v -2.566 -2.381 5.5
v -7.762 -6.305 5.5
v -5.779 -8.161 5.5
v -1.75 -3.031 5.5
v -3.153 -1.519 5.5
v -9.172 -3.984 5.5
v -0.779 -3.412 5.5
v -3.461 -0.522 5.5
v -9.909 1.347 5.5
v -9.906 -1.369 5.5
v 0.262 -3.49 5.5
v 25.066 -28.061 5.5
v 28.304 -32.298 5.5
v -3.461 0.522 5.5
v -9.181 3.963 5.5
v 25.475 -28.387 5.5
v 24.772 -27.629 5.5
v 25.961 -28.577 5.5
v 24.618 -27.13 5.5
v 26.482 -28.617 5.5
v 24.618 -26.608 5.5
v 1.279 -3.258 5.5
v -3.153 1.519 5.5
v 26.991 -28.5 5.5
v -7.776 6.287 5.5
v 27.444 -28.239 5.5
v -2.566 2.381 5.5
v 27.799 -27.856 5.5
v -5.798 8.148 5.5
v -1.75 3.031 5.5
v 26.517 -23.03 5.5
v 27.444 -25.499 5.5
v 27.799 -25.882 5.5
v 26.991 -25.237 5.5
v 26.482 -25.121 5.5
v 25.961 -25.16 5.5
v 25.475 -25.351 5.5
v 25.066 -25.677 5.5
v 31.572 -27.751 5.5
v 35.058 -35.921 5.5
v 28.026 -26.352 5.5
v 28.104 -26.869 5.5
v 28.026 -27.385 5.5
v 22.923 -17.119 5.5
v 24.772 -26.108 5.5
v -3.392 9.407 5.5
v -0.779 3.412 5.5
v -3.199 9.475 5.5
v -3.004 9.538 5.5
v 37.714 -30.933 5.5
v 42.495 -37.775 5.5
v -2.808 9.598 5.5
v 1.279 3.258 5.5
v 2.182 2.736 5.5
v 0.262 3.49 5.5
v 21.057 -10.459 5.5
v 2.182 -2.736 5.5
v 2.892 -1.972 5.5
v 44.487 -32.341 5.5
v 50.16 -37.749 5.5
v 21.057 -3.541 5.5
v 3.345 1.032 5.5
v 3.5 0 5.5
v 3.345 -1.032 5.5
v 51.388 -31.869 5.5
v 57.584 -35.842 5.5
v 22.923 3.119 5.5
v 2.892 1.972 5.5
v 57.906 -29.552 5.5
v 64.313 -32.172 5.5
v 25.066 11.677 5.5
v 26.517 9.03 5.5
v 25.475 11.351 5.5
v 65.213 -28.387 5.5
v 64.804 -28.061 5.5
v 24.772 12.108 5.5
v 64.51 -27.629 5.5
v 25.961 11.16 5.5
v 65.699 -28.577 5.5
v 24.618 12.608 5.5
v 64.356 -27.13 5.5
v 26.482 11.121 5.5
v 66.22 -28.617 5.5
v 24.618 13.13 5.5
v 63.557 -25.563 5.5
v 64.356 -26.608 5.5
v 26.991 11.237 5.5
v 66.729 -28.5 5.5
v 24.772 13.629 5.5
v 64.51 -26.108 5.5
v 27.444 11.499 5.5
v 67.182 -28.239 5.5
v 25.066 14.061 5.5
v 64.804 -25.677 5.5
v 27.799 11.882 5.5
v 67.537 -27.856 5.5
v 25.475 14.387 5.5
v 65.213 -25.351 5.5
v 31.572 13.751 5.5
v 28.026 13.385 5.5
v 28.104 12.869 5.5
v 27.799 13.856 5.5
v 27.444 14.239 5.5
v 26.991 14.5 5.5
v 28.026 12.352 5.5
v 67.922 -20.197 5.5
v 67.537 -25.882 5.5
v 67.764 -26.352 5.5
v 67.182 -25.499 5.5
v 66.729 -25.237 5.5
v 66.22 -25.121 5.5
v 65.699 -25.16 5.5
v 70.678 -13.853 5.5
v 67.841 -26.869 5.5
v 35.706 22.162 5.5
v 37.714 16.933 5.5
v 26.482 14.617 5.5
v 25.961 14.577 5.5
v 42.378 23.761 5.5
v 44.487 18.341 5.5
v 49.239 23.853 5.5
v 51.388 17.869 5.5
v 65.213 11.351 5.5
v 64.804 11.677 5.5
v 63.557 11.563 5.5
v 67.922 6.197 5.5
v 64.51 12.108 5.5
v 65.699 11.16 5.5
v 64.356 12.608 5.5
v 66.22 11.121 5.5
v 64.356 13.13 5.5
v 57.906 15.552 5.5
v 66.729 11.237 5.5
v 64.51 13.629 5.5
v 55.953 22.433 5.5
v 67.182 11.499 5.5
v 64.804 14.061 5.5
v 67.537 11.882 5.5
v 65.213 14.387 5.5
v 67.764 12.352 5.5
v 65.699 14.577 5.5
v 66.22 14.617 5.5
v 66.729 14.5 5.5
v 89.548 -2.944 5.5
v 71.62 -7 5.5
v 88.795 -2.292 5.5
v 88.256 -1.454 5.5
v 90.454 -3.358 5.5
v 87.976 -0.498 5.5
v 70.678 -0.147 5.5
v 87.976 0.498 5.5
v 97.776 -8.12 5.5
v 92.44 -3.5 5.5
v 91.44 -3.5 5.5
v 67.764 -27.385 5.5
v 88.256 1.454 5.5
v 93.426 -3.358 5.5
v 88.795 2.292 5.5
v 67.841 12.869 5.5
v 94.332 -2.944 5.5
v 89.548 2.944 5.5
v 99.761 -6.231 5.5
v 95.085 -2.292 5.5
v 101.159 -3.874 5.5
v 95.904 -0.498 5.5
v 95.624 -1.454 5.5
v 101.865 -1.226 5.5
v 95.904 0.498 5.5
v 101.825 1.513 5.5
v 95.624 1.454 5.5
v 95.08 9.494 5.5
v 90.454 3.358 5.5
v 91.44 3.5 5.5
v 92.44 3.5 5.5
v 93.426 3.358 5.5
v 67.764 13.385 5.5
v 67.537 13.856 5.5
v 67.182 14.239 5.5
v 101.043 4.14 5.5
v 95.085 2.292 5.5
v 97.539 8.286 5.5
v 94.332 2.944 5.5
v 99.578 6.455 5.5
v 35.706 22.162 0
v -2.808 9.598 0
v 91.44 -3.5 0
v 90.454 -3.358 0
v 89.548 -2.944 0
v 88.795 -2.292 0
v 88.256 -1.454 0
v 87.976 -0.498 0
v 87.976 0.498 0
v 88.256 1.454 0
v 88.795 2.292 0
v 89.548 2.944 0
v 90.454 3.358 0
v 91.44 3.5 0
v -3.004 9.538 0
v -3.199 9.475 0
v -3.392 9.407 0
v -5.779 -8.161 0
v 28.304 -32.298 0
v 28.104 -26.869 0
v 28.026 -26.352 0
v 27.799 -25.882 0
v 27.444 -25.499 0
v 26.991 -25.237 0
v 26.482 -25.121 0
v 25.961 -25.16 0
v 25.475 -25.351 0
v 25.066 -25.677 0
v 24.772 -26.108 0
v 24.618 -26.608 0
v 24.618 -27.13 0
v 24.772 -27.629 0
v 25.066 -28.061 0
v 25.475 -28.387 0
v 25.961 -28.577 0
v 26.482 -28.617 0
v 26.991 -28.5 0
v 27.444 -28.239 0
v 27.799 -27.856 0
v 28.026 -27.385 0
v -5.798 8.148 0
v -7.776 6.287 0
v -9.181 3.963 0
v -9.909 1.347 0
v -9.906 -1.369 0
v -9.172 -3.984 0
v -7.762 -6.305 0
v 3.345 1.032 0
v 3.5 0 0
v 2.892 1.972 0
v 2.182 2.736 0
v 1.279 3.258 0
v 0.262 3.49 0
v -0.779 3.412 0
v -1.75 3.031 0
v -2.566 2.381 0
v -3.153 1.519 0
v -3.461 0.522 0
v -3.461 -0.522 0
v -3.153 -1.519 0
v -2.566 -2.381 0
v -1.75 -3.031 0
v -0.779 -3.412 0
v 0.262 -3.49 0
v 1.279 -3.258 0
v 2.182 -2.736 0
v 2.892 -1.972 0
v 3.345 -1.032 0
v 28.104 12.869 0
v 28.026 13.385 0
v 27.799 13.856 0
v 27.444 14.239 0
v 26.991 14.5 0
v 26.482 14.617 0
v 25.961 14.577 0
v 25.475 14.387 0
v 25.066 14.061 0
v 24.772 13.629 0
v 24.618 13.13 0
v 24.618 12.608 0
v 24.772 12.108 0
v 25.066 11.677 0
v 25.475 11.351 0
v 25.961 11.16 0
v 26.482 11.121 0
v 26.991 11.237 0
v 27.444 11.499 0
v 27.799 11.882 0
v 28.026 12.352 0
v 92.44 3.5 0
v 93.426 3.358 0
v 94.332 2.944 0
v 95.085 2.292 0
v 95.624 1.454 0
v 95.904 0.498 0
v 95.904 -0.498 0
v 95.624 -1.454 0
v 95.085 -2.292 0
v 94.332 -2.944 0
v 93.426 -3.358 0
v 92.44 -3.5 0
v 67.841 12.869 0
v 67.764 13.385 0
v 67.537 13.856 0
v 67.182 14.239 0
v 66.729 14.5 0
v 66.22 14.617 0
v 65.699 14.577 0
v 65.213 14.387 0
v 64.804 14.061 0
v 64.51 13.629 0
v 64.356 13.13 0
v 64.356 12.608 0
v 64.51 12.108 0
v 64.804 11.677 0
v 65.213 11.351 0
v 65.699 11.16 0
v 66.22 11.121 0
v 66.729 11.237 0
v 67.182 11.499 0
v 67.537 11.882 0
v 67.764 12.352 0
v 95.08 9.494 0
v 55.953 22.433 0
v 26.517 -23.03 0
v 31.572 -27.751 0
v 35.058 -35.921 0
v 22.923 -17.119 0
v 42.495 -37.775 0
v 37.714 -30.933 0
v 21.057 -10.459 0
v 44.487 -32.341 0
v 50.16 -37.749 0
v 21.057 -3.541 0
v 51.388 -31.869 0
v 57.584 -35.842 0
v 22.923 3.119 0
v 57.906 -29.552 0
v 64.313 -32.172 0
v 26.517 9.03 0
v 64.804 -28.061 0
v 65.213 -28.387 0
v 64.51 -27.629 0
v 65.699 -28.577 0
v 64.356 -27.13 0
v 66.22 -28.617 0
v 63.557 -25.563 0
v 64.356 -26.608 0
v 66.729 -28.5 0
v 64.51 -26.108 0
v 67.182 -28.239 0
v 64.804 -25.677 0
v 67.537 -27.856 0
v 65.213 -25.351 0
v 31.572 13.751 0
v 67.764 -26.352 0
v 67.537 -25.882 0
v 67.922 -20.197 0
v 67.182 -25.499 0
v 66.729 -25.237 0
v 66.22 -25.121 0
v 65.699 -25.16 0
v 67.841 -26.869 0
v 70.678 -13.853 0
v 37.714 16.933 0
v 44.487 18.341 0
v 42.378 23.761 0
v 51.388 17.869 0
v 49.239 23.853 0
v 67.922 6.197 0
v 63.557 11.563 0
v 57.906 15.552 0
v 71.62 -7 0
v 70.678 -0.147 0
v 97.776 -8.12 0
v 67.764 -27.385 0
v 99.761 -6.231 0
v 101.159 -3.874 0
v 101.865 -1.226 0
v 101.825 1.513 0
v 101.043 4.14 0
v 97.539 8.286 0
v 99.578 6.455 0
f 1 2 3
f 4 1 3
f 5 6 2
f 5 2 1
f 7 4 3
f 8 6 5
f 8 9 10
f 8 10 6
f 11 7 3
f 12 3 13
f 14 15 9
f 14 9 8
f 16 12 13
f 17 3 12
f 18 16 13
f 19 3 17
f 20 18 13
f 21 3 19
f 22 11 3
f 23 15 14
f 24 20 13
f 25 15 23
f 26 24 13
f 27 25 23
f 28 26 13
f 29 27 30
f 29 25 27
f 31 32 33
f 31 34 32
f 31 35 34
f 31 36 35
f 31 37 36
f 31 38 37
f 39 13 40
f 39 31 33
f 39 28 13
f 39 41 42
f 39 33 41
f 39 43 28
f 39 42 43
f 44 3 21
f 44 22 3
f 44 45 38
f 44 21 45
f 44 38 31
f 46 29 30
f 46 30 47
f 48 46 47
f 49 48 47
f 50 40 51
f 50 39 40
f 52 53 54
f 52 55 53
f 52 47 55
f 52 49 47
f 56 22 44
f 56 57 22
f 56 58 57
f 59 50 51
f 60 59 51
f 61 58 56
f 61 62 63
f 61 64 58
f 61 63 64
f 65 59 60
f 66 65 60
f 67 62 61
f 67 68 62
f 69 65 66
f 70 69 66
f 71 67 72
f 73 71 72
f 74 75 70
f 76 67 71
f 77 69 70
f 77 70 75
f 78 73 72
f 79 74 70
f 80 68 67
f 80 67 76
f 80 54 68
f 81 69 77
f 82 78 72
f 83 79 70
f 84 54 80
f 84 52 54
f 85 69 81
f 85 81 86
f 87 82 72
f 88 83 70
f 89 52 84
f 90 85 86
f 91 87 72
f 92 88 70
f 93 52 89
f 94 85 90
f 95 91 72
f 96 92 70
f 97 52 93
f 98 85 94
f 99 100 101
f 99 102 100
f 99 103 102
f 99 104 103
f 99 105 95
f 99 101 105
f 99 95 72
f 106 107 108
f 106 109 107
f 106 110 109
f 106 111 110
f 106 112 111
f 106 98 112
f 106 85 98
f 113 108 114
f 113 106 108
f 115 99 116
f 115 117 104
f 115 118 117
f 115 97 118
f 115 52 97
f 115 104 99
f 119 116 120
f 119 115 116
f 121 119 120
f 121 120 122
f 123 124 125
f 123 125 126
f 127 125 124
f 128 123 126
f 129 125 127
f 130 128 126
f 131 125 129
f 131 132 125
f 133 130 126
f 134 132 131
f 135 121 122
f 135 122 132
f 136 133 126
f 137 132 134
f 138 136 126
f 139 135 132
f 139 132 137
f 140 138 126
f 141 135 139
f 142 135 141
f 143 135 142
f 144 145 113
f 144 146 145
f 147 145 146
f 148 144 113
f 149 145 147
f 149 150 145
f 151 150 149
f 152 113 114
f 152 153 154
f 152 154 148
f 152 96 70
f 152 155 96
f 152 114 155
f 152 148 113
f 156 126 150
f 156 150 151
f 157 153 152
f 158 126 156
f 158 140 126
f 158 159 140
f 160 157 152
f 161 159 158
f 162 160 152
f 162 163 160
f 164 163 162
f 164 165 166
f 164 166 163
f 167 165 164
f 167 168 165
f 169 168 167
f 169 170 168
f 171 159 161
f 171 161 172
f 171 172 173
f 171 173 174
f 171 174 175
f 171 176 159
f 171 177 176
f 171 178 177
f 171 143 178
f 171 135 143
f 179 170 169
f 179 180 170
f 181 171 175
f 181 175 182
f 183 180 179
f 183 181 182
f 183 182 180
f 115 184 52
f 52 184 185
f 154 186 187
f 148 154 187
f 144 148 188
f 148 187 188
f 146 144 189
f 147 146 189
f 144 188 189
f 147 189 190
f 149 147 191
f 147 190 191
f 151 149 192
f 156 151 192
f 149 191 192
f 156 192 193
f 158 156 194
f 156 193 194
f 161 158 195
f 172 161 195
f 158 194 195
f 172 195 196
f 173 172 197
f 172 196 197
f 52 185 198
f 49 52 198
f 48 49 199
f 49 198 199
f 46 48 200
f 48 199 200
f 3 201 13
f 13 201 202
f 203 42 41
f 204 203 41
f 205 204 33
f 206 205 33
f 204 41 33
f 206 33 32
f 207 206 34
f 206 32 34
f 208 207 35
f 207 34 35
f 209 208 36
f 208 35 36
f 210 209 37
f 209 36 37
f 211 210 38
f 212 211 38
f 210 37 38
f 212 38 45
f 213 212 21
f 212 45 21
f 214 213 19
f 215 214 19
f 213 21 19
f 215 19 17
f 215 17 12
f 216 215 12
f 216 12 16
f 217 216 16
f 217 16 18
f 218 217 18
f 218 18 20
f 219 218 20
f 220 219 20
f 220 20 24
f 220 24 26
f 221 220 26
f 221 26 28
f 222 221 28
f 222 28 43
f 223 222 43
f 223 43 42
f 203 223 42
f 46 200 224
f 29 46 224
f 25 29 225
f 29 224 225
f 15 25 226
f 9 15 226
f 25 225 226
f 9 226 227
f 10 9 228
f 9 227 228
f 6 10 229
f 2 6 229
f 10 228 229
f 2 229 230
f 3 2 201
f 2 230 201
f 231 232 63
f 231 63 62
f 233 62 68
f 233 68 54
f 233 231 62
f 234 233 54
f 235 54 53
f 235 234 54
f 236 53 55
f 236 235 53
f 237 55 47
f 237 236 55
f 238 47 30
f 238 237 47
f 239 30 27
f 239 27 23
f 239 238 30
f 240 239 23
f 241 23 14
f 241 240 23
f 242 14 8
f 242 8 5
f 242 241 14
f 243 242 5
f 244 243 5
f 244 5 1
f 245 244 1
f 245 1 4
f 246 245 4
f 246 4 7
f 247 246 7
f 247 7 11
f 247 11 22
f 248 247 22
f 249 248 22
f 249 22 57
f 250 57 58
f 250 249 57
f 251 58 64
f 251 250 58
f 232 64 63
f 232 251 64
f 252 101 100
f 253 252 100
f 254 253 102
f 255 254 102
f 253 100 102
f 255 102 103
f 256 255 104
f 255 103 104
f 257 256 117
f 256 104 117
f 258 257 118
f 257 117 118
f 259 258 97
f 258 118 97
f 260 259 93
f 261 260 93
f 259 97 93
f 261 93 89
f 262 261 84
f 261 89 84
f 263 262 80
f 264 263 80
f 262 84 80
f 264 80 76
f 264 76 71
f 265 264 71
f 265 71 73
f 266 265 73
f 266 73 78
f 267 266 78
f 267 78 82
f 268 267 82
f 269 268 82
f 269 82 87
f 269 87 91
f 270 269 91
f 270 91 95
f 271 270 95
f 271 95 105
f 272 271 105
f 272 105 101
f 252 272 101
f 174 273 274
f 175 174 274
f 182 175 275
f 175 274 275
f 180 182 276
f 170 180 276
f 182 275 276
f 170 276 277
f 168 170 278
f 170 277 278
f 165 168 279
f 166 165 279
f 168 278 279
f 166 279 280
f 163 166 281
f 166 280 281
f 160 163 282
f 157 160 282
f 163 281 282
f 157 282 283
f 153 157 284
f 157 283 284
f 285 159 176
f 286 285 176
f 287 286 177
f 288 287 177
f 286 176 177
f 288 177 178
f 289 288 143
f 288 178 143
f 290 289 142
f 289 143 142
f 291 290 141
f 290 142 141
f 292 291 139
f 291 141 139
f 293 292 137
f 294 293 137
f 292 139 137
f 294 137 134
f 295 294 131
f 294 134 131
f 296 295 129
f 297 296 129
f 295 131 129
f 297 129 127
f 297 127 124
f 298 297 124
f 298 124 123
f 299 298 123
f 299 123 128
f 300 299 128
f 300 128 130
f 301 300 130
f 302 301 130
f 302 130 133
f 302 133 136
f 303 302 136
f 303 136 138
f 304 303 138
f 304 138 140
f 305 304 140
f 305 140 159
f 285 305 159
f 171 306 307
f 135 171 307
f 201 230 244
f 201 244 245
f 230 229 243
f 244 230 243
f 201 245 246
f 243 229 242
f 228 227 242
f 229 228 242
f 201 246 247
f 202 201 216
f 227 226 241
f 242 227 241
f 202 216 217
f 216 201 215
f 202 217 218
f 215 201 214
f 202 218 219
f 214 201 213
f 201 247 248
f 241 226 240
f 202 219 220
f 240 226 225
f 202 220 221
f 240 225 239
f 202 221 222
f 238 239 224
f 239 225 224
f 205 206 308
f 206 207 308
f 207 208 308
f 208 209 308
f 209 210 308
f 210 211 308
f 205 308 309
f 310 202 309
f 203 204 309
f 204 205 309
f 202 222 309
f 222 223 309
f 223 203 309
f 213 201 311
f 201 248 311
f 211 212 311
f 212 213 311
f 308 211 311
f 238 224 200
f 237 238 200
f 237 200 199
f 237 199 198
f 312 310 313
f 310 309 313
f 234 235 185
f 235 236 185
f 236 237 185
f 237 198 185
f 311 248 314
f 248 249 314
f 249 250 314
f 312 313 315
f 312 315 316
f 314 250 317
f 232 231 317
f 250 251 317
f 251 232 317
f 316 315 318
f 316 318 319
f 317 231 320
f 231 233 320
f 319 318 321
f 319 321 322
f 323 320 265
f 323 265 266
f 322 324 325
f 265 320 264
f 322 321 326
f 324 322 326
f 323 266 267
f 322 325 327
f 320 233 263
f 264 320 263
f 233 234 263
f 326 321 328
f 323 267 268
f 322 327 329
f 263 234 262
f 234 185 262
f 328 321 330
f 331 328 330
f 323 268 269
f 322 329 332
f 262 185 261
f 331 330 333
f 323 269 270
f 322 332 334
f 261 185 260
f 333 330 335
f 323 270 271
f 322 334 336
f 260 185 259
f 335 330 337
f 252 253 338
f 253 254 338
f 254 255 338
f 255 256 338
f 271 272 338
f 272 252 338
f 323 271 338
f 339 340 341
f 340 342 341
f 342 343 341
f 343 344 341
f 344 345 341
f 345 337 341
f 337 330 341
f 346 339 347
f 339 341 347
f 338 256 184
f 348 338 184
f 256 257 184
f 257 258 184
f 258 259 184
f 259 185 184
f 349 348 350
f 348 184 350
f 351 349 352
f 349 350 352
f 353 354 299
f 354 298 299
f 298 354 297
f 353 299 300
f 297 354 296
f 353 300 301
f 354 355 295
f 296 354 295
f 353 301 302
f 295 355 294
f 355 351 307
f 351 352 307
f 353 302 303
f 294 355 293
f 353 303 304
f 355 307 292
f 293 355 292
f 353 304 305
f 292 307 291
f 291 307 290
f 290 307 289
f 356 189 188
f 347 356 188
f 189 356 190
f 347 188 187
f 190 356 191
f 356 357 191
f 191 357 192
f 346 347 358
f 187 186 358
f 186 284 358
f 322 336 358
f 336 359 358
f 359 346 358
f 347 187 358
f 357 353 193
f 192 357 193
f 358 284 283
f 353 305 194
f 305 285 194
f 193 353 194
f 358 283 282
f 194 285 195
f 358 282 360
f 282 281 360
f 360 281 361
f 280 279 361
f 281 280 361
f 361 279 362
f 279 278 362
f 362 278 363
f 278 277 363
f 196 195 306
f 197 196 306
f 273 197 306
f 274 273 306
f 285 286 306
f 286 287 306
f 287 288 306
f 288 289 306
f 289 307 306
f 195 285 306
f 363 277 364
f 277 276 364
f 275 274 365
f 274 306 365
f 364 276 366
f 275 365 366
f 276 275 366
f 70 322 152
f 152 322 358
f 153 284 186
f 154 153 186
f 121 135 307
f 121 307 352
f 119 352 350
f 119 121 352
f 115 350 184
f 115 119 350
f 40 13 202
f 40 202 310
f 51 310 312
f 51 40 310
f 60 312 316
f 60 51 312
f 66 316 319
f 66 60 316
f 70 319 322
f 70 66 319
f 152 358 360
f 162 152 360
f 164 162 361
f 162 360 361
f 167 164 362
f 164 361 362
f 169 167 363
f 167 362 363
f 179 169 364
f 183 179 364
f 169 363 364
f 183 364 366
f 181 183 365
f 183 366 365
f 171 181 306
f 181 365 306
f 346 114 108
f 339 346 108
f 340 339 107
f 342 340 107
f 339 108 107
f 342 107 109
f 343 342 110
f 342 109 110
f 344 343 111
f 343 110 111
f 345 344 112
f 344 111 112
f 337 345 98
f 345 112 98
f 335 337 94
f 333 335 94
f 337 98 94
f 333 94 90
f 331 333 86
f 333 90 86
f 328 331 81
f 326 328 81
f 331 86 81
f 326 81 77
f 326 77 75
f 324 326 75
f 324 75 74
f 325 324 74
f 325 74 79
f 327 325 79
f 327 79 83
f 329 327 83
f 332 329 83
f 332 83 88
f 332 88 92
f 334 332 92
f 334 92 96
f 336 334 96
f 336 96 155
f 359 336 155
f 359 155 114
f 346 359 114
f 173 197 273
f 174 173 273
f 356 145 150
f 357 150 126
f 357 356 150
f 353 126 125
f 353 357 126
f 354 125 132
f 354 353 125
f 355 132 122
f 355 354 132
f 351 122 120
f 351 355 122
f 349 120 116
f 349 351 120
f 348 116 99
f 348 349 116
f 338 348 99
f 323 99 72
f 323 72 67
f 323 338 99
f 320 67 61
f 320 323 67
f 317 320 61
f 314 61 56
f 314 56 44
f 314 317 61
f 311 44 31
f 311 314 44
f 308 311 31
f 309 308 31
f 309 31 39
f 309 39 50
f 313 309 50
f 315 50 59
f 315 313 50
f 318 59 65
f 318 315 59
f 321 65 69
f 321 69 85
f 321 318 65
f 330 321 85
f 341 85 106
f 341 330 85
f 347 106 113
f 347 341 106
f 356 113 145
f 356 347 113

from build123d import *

# Parameters (mm, degrees)
F0_R      = 3.5
F0_R_2    = 25.4
F1_DEPTH  = 5.5
F2_DEPTH  = 33
F3_DEPTH  = 28
F4_R      = 2.5
F5_DEPTH  = 25.4
F6_R      = 5.08
F7_R      = 40.64
F8_DEPTH  = 33
F9_R      = 1.7526
F10_DEPTH = 5.501


with BuildPart() as f1:
    # F0 (on Top) → F1 (new body)
    with BuildSketch(Plane.XY):
        with BuildLine():
            Line((-3.3917498572, 9.4072330101), (-2.8084065037, 9.5975441082))
            ThreePointArc((-2.8084065037, 9.5975441082), (-3.1015382157, 9.5068638728), (-3.3917498572, 9.4072330101))
        make_face()
        with BuildLine():
            Line((35.7055754428, 22.1624223313), (-2.8084065037, 9.5975441082))
            Line((-2.8084065037, 9.5975441082), (-3.3917498572, 9.4072330101))
            ThreePointArc((-3.3917498572, 9.4072330101), (-9.9089012804, 1.3467276694), (-5.7794328291, -8.1607693371))
            Line((-5.7794328291, -8.1607693371), (28.3037582299, -32.2983849452))
            ThreePointArc((28.3037582299, -32.2983849452), (15.5024060308, -2.8251442248), (35.7055754428, 22.1624223313))
        make_face()
        Circle(F0_R, mode=Mode.SUBTRACT)
        with BuildLine():
            ThreePointArc((55.9525424009, 22.43259449), (45.80637798, 23.9972404711), (35.7055754428, 22.1624223313))
            ThreePointArc((35.7055754428, 22.1624223313), (15.5024060308, -2.8251442248), (28.3037582299, -32.2983849452))
            ThreePointArc((28.3037582299, -32.2983849452), (46.3284941146, -37.999810145), (64.3128808741, -32.1723590805))
            ThreePointArc((64.3128808741, -32.1723590805), (73.805134648, -21.1442690321), (77.22, -7))
            ThreePointArc((77.22, -7), (71.3467667481, 11.1561447666), (55.9525424009, 22.43259449))
        make_face()
        with Locations((46.22, -7)):
            Circle(F0_R_2, mode=Mode.SUBTRACT)
        with BuildLine():
            Line((95.0795298067, 9.4943853194), (55.9525424009, 22.43259449))
            ThreePointArc((55.9525424009, 22.43259449), (71.3467667481, 11.1561447666), (77.22, -7))
            ThreePointArc((77.22, -7), (73.805134648, -21.1442690321), (64.3128808741, -32.1723590805))
            Line((64.3128808741, -32.1723590805), (97.7764131852, -8.1201158324))
            ThreePointArc((97.7764131852, -8.1201158324), (101.8248141538, 1.5134229894), (95.0795298067, 9.4943853194))
        make_face()
        with BuildLine():
            ThreePointArc((91.44, -3.5), (87.94, 0), (91.44, 3.5))
            Line((91.44, 3.5), (92.44, 3.5))
            ThreePointArc((92.44, 3.5), (95.94, 0), (92.44, -3.5))
            Line((92.44, -3.5), (91.44, -3.5))
        make_face(mode=Mode.SUBTRACT)
    extrude(amount=F1_DEPTH)

    # F0 (on Top) → F2 (join)
    with BuildSketch(Plane.XY):
        with BuildLine():
            ThreePointArc((55.9525424009, 22.43259449), (45.80637798, 23.9972404711), (35.7055754428, 22.1624223313))
            ThreePointArc((35.7055754428, 22.1624223313), (15.5024060308, -2.8251442248), (28.3037582299, -32.2983849452))
            ThreePointArc((28.3037582299, -32.2983849452), (46.3284941146, -37.999810145), (64.3128808741, -32.1723590805))
            ThreePointArc((64.3128808741, -32.1723590805), (73.805134648, -21.1442690321), (77.22, -7))
            ThreePointArc((77.22, -7), (71.3467667481, 11.1561447666), (55.9525424009, 22.43259449))
        make_face()
        with Locations((46.22, -7)):
            Circle(F0_R_2, mode=Mode.SUBTRACT)
        with Locations((46.22, -7)):
            Circle(F0_R_2)
    extrude(amount=-F2_DEPTH)

    # F0 (on Top) → F3 (cut)
    with BuildSketch(Plane.XY):
        with Locations((46.22, -7)):
            Circle(F0_R_2)
    extrude(amount=-F3_DEPTH, mode=Mode.SUBTRACT)

    # F4 (on face) → F5 (cut)
    with BuildSketch(Plane(origin=(0, 0, -33), x_dir=(1, 0, 0), z_dir=(0, 0, -1))):
        with Locations((46.22, 7)):
            Circle(F4_R)
    extrude(amount=-F5_DEPTH, mode=Mode.SUBTRACT)

    # F6
    f6_edges = [f1.edges().sort_by_distance(p)[0] for p in [
        (36.487458, -36.432594, -33),
    ]]
    fillet(f6_edges, radius=F6_R)

    # F7 (on face) → F8 (cut, through all)
    with BuildSketch(Plane(origin=(0, 0, -33), x_dir=(1, 0, 0), z_dir=(0, 0, -1))):
        with Locations((46.22, 7)):
            Circle(F7_R)
    extrude(amount=-F8_DEPTH, mode=Mode.SUBTRACT)

    # F9 (on face) → F10 (cut, through all)
    with BuildSketch(Plane.XY.offset(5.5)):
        with Locations((26.3511833321, 12.8688166679)):
            Circle(F9_R)
        with Locations((26.3511833321, -26.8688166679)):
            Circle(F9_R)
        with Locations((66.0888166679, -26.8688166679)):
            Circle(F9_R)
        with Locations((66.0888166679, 12.8688166679)):
            Circle(F9_R)
    extrude(amount=-F10_DEPTH, mode=Mode.SUBTRACT)


solid = f1.part
